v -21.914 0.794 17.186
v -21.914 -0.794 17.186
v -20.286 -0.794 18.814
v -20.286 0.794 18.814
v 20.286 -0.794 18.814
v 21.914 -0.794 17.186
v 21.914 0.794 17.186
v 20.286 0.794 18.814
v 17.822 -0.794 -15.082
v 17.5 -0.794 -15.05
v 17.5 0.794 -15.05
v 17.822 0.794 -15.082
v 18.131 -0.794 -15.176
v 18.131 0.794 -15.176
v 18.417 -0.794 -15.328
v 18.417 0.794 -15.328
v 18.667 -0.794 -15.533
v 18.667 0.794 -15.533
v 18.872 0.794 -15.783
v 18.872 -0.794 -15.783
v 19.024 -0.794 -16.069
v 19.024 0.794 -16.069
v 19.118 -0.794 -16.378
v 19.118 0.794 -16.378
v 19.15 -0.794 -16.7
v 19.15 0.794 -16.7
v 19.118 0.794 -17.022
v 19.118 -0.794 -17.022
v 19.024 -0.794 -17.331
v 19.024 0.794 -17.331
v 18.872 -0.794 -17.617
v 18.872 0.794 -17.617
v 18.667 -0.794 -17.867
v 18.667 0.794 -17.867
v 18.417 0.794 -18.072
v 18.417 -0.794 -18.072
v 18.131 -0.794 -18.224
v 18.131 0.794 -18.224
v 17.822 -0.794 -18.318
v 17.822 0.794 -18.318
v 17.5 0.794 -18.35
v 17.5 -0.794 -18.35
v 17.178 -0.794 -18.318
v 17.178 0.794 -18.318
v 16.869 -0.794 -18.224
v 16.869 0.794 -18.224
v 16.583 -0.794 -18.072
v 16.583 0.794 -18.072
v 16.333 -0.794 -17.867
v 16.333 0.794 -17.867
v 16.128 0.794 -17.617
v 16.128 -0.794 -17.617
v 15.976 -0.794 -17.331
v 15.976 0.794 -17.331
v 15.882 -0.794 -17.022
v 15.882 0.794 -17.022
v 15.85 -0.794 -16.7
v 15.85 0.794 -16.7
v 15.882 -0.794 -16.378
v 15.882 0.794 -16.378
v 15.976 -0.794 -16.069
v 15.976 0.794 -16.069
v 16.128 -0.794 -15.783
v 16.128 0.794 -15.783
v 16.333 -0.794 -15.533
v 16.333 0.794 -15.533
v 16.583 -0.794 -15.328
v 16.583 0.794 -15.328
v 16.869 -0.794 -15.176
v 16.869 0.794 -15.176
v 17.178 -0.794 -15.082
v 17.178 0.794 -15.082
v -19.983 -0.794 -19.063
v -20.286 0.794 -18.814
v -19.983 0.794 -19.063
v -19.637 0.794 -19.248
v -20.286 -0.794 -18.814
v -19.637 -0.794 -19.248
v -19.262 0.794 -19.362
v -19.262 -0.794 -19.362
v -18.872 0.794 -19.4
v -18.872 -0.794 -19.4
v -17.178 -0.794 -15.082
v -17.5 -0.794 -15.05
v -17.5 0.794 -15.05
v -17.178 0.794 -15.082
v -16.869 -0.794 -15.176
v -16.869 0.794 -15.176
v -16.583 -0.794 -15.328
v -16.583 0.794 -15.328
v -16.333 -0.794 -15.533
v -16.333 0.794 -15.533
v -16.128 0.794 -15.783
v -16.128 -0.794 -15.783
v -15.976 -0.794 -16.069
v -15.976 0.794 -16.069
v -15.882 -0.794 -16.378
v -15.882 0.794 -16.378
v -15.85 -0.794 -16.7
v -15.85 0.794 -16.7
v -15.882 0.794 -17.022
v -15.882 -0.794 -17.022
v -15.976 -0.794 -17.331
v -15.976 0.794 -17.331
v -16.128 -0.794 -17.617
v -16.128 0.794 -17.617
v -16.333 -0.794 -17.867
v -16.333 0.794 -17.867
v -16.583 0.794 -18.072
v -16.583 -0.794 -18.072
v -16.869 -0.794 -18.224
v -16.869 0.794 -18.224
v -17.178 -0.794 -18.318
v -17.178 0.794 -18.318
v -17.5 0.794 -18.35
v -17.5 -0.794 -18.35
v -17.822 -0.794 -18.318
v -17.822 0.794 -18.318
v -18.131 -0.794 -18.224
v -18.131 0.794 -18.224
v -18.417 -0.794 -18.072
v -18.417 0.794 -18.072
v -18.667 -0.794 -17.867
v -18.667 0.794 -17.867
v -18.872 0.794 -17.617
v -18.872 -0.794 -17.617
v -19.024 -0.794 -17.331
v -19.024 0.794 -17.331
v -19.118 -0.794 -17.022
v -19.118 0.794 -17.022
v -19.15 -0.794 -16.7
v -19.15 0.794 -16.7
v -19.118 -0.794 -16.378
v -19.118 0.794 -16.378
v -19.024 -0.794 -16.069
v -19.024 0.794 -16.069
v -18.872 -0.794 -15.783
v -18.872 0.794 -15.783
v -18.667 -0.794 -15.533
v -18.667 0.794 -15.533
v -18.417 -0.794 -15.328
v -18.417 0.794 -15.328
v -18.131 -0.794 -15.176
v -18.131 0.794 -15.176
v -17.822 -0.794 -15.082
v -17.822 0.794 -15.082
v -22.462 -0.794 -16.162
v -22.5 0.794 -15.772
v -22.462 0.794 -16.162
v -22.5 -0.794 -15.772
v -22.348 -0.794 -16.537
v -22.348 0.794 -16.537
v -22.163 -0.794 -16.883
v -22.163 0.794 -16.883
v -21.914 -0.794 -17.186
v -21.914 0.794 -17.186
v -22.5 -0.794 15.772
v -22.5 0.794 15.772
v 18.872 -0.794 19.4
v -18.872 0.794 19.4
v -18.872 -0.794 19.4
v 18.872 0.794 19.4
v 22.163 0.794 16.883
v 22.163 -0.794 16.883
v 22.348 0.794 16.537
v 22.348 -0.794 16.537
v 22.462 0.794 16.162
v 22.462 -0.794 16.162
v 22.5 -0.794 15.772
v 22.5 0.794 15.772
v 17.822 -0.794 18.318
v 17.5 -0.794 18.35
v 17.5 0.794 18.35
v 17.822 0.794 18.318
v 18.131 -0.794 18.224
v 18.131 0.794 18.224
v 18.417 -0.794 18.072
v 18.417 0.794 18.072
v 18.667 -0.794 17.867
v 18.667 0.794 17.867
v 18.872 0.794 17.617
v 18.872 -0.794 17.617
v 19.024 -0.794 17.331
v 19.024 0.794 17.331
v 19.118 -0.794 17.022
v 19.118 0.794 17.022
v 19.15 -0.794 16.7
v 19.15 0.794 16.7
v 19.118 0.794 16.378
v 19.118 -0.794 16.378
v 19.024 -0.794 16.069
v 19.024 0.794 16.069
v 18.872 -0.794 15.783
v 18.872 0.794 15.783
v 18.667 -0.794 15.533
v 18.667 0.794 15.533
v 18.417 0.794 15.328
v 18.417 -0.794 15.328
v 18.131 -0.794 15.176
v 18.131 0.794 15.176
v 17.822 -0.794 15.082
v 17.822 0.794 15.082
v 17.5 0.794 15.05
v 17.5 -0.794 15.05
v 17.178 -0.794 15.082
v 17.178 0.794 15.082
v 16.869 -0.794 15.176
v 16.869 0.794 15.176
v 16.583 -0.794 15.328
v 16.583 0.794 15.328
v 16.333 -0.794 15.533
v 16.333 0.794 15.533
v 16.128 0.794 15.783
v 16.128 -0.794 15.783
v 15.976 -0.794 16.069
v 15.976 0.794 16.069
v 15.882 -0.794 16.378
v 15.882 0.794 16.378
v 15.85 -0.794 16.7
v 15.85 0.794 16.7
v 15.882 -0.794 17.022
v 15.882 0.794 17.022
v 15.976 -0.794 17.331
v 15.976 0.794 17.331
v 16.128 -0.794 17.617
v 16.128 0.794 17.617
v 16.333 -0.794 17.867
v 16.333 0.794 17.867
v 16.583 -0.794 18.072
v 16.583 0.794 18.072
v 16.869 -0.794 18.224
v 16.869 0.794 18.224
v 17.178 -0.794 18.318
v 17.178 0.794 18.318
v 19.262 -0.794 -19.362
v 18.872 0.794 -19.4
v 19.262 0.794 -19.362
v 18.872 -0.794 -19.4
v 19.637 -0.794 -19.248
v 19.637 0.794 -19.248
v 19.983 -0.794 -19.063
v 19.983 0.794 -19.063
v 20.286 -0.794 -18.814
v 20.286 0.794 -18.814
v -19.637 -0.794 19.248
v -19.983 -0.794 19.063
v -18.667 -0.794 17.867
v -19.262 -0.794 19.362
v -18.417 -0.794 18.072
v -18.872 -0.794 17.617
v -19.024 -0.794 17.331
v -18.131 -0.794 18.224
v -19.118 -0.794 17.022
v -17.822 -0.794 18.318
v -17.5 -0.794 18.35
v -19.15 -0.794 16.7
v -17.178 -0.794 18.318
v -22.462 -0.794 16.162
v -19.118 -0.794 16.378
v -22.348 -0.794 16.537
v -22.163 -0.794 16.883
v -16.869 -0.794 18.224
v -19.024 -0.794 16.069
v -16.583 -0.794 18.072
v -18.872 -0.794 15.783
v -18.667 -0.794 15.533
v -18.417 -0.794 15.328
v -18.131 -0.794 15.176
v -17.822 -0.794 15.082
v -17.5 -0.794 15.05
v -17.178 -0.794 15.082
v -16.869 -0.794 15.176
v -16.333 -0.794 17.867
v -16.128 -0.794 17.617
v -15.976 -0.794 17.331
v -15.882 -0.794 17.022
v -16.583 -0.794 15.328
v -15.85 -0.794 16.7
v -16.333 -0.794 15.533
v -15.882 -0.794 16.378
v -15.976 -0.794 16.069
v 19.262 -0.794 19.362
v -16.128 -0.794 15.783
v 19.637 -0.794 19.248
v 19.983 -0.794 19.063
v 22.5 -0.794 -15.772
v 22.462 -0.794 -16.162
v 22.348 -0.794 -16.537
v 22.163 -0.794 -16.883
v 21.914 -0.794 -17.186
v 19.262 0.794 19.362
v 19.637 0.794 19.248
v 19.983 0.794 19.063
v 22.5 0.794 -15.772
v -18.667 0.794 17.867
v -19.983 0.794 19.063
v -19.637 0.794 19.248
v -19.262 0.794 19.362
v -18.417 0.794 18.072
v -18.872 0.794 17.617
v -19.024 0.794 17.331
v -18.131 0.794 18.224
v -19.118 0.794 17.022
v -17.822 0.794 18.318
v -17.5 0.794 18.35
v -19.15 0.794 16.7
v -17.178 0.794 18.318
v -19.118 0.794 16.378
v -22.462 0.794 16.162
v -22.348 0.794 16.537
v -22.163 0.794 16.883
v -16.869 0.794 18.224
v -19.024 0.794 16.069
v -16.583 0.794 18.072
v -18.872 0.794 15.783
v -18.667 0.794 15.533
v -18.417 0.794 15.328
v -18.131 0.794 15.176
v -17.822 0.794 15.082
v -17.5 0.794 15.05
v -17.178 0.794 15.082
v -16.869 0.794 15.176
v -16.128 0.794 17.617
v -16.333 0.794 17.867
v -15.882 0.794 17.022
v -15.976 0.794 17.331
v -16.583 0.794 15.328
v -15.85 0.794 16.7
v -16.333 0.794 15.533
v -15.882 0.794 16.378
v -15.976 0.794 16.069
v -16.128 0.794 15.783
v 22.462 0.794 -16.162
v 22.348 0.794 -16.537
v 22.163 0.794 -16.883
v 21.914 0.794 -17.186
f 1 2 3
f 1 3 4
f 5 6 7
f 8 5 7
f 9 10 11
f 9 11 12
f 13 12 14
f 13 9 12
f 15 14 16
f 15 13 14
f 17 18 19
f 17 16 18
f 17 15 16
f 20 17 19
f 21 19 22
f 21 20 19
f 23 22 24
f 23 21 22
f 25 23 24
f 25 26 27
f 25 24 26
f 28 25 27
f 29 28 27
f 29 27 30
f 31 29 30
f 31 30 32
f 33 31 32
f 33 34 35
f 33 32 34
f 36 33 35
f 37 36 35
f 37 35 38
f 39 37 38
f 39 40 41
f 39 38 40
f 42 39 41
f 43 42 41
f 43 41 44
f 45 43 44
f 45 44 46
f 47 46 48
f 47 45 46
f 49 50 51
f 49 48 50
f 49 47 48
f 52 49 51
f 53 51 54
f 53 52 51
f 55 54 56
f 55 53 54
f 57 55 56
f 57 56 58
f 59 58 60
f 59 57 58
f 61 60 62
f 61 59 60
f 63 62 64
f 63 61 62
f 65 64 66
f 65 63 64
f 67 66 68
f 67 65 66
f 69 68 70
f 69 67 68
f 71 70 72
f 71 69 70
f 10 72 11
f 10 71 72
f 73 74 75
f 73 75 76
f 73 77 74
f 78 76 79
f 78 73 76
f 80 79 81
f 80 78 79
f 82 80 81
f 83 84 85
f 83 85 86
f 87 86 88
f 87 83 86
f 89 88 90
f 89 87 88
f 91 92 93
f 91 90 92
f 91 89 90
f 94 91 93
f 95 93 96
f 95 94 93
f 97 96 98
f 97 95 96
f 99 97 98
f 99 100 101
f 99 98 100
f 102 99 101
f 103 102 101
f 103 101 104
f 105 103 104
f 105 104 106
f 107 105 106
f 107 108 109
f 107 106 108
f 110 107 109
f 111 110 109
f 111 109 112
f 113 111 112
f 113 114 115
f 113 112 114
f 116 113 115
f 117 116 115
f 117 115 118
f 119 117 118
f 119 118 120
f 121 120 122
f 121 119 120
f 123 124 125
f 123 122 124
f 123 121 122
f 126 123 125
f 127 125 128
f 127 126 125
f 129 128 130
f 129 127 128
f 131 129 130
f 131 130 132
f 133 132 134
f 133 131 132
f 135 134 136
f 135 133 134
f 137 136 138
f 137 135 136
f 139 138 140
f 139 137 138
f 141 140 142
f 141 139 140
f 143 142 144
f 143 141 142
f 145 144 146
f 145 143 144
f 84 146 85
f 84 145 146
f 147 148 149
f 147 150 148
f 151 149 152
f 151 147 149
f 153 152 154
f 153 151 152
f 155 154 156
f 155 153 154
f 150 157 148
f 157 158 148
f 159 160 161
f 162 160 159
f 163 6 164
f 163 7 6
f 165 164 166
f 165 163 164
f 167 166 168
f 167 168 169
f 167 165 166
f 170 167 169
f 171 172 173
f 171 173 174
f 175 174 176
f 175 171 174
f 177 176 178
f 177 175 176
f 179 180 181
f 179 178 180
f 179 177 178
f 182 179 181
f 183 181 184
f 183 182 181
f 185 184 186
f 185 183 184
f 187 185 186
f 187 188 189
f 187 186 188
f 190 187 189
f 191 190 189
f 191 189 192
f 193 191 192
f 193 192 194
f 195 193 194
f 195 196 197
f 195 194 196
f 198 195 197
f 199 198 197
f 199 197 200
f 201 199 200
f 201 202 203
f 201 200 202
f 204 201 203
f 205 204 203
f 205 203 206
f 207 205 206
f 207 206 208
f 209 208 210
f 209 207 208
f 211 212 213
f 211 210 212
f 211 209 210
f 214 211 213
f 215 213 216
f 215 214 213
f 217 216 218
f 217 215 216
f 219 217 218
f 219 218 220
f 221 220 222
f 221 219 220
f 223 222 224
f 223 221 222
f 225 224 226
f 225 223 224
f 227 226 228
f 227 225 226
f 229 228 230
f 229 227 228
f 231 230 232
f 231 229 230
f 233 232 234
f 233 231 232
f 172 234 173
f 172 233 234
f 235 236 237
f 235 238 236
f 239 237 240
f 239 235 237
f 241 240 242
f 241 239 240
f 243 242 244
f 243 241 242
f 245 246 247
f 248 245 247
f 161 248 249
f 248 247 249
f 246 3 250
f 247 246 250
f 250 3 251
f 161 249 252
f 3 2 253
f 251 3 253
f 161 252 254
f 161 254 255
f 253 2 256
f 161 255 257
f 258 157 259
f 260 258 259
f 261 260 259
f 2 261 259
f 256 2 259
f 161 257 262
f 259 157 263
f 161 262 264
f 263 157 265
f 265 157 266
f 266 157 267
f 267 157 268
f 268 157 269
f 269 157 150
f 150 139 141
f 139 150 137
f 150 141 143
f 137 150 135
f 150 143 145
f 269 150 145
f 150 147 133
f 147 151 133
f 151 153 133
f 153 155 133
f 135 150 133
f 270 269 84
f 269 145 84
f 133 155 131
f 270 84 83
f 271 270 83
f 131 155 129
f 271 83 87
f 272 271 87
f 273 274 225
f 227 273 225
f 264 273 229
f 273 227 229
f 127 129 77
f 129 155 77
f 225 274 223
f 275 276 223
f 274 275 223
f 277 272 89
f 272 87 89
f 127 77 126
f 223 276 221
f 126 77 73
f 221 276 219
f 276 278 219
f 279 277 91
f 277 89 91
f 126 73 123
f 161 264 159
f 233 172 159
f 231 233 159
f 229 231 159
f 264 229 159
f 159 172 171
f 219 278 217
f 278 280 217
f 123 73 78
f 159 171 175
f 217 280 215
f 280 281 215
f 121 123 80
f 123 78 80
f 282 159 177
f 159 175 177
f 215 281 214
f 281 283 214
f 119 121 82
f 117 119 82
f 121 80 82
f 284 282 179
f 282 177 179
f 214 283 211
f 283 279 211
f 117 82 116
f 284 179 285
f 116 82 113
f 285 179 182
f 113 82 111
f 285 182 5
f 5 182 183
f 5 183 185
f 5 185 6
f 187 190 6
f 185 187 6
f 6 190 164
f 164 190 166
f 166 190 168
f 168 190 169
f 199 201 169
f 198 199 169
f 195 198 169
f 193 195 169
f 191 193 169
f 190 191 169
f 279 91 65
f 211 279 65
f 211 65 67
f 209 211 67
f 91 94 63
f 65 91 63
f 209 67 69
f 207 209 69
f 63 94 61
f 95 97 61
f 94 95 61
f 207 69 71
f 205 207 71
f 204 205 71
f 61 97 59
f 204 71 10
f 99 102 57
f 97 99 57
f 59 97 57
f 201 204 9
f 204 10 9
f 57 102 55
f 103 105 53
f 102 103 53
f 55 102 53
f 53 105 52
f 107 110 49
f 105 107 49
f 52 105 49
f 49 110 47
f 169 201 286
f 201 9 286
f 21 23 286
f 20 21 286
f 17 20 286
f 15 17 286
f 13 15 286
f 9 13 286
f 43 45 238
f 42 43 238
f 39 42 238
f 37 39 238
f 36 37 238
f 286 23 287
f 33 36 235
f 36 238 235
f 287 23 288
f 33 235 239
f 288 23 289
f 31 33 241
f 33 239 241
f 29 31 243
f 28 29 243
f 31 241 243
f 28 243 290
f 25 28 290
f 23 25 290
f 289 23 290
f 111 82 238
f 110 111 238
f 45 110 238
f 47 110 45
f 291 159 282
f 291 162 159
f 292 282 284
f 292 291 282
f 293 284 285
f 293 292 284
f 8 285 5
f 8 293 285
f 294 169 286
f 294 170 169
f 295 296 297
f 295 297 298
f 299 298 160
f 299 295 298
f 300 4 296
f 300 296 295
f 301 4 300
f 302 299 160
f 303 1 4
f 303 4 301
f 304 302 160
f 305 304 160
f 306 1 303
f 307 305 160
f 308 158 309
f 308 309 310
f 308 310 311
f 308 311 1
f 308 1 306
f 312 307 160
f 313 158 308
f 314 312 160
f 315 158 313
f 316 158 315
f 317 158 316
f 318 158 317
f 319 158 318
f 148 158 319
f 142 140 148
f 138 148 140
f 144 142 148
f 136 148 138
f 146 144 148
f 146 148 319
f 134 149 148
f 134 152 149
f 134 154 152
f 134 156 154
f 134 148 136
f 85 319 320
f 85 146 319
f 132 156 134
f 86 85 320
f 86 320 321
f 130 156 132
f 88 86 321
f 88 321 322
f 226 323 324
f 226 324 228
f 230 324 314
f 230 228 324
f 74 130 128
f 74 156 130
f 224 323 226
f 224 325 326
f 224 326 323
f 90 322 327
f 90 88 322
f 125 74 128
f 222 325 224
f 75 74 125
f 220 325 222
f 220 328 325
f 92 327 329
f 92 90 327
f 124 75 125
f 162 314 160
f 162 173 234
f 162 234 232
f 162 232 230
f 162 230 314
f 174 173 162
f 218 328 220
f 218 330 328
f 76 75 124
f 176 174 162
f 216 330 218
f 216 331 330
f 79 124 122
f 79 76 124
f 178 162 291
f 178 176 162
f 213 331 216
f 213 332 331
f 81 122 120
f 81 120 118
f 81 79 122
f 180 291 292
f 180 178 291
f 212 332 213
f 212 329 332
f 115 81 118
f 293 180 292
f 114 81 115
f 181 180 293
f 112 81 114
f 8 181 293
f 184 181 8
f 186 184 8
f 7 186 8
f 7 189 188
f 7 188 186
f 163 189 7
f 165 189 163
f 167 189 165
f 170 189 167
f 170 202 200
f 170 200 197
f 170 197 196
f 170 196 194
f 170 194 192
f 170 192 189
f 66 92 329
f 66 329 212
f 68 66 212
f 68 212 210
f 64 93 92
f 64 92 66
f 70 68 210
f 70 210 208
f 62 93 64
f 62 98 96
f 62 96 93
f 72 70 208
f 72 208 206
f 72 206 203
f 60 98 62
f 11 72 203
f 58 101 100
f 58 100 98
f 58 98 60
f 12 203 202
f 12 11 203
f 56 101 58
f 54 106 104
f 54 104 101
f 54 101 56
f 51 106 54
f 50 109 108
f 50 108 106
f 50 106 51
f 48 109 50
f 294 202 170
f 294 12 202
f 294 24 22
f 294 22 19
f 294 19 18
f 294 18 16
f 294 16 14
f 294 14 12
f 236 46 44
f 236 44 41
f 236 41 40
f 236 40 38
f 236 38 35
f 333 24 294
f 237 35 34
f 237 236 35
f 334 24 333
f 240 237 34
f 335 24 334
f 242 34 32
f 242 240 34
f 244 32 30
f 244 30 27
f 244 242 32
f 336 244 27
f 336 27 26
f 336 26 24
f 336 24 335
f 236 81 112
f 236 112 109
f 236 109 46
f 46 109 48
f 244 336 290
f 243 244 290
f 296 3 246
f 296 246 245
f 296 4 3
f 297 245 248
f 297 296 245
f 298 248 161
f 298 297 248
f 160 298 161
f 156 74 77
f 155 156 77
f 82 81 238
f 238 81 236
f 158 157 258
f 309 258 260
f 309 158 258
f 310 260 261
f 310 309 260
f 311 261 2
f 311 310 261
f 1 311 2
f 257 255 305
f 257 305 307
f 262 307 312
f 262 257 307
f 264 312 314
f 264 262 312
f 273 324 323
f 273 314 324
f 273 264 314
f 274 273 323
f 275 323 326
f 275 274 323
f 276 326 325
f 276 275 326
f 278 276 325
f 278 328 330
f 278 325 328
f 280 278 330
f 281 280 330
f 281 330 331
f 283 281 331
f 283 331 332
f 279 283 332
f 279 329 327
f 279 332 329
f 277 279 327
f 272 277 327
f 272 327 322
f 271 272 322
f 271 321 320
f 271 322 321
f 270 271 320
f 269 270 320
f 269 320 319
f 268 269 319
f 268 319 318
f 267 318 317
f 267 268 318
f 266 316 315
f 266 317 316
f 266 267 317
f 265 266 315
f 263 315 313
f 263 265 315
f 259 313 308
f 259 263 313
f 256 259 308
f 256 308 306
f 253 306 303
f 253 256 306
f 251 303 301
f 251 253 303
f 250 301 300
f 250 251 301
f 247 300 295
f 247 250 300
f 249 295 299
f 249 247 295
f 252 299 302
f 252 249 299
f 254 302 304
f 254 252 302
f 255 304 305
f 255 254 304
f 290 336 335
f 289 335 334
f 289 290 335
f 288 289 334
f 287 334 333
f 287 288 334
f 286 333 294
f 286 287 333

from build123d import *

# Parameters (mm, degrees)
SKETCH1_W               = 45
SKETCH1_H               = 38.8
BOSS_EXTRUDE1_DEPTH     = 0.79375
CUT_EXTRUDE1_DEPTH      = 30.751137058
CUT_EXTRUDE1_DEPTH_BACK = 30.751137058
SKETCH2_R               = 1.65
CHAMFER1_SIZE           = 2.8
FILLET1_R               = 2


with BuildPart() as part:
    # Sketch1 → Boss-Extrude1 (new, symmetric)
    with BuildSketch(Plane(origin=(0, 0, 0), x_dir=(1, 0, 0), z_dir=(0, 1, 0))):
        Rectangle(SKETCH1_W, SKETCH1_H)
    extrude(amount=BOSS_EXTRUDE1_DEPTH, both=True)

    # Sketch2 → Cut-Extrude1 (cut, two sides: drawn at the far end of the back side and taken through both)
    with BuildSketch(Plane(origin=(0, 0.79375, 0), x_dir=(1, 0, 0), z_dir=(0, 1, 0)).offset(-CUT_EXTRUDE1_DEPTH_BACK)):
        with Locations(Location((-17.5, 16.7, 0), (0, 0, 270))):
            Circle(SKETCH2_R)
        with Locations(Location((17.5, 16.7, 0), (0, 0, 270))):
            Circle(SKETCH2_R)
        with Locations(Location((17.5, -16.7, 0), (0, 0, 270))):
            Circle(SKETCH2_R)
        with Locations(Location((-17.5, -16.7, 0), (0, 0, 270))):
            Circle(SKETCH2_R)
    extrude(amount=CUT_EXTRUDE1_DEPTH + CUT_EXTRUDE1_DEPTH_BACK, mode=Mode.SUBTRACT)

    # Chamfer1
    chamfer1_edges = [part.edges().sort_by_distance(p)[0] for p in [
        (22.5, 0, 19.4),
        (-22.5, 0, 19.4),
        (-22.5, 0, -19.4),
        (22.5, 0, -19.4),
    ]]
    chamfer(chamfer1_edges, length=CHAMFER1_SIZE)

    # Fillet1
    fillet1_edges = [part.edges().sort_by_distance(p)[0] for p in [
        (19.7, 0, 19.4),
        (-19.7, 0, 19.4),
        (-22.5, 0, -16.6),
        (-22.5, 0, 16.6),
        (19.7, 0, -19.4),
        (-19.7, 0, -19.4),
        (22.5, 0, 16.6),
        (22.5, 0, -16.6),
    ]]
    fillet(fillet1_edges, radius=FILLET1_R)


solid = part.part
